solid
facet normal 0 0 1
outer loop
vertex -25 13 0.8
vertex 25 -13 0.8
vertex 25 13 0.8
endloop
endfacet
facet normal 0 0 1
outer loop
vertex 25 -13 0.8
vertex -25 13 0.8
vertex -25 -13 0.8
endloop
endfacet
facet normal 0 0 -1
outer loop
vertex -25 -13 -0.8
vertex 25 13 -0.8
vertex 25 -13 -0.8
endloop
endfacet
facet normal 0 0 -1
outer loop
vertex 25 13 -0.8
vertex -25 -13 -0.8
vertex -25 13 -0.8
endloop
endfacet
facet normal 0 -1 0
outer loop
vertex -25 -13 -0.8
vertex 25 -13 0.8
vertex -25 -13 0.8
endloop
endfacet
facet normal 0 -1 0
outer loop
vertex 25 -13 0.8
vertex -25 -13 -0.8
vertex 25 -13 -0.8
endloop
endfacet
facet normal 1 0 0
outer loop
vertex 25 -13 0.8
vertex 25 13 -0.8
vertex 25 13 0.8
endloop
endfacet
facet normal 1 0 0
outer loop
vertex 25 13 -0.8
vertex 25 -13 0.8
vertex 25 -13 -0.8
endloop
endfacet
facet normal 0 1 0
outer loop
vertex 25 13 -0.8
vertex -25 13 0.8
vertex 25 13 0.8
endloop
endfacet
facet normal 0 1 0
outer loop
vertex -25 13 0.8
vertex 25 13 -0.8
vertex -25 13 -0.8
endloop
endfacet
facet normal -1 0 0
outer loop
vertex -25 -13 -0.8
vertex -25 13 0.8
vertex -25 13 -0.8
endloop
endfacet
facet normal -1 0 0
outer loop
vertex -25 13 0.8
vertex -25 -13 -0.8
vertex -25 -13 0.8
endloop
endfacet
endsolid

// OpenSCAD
// Relay module PCB: 50.0mm x 26.0mm x 1.6mm (one connected solid)

length = 50.0;     // mm
width  = 26.0;     // mm
thickness = 1.6;   // mm

module relay_module_pcb() {
    // Centered geometry improves visibility in many render pipelines
    color([0.0, 0.4, 0.2])
        cube([length, width, thickness], center=true);
}

relay_module_pcb();
